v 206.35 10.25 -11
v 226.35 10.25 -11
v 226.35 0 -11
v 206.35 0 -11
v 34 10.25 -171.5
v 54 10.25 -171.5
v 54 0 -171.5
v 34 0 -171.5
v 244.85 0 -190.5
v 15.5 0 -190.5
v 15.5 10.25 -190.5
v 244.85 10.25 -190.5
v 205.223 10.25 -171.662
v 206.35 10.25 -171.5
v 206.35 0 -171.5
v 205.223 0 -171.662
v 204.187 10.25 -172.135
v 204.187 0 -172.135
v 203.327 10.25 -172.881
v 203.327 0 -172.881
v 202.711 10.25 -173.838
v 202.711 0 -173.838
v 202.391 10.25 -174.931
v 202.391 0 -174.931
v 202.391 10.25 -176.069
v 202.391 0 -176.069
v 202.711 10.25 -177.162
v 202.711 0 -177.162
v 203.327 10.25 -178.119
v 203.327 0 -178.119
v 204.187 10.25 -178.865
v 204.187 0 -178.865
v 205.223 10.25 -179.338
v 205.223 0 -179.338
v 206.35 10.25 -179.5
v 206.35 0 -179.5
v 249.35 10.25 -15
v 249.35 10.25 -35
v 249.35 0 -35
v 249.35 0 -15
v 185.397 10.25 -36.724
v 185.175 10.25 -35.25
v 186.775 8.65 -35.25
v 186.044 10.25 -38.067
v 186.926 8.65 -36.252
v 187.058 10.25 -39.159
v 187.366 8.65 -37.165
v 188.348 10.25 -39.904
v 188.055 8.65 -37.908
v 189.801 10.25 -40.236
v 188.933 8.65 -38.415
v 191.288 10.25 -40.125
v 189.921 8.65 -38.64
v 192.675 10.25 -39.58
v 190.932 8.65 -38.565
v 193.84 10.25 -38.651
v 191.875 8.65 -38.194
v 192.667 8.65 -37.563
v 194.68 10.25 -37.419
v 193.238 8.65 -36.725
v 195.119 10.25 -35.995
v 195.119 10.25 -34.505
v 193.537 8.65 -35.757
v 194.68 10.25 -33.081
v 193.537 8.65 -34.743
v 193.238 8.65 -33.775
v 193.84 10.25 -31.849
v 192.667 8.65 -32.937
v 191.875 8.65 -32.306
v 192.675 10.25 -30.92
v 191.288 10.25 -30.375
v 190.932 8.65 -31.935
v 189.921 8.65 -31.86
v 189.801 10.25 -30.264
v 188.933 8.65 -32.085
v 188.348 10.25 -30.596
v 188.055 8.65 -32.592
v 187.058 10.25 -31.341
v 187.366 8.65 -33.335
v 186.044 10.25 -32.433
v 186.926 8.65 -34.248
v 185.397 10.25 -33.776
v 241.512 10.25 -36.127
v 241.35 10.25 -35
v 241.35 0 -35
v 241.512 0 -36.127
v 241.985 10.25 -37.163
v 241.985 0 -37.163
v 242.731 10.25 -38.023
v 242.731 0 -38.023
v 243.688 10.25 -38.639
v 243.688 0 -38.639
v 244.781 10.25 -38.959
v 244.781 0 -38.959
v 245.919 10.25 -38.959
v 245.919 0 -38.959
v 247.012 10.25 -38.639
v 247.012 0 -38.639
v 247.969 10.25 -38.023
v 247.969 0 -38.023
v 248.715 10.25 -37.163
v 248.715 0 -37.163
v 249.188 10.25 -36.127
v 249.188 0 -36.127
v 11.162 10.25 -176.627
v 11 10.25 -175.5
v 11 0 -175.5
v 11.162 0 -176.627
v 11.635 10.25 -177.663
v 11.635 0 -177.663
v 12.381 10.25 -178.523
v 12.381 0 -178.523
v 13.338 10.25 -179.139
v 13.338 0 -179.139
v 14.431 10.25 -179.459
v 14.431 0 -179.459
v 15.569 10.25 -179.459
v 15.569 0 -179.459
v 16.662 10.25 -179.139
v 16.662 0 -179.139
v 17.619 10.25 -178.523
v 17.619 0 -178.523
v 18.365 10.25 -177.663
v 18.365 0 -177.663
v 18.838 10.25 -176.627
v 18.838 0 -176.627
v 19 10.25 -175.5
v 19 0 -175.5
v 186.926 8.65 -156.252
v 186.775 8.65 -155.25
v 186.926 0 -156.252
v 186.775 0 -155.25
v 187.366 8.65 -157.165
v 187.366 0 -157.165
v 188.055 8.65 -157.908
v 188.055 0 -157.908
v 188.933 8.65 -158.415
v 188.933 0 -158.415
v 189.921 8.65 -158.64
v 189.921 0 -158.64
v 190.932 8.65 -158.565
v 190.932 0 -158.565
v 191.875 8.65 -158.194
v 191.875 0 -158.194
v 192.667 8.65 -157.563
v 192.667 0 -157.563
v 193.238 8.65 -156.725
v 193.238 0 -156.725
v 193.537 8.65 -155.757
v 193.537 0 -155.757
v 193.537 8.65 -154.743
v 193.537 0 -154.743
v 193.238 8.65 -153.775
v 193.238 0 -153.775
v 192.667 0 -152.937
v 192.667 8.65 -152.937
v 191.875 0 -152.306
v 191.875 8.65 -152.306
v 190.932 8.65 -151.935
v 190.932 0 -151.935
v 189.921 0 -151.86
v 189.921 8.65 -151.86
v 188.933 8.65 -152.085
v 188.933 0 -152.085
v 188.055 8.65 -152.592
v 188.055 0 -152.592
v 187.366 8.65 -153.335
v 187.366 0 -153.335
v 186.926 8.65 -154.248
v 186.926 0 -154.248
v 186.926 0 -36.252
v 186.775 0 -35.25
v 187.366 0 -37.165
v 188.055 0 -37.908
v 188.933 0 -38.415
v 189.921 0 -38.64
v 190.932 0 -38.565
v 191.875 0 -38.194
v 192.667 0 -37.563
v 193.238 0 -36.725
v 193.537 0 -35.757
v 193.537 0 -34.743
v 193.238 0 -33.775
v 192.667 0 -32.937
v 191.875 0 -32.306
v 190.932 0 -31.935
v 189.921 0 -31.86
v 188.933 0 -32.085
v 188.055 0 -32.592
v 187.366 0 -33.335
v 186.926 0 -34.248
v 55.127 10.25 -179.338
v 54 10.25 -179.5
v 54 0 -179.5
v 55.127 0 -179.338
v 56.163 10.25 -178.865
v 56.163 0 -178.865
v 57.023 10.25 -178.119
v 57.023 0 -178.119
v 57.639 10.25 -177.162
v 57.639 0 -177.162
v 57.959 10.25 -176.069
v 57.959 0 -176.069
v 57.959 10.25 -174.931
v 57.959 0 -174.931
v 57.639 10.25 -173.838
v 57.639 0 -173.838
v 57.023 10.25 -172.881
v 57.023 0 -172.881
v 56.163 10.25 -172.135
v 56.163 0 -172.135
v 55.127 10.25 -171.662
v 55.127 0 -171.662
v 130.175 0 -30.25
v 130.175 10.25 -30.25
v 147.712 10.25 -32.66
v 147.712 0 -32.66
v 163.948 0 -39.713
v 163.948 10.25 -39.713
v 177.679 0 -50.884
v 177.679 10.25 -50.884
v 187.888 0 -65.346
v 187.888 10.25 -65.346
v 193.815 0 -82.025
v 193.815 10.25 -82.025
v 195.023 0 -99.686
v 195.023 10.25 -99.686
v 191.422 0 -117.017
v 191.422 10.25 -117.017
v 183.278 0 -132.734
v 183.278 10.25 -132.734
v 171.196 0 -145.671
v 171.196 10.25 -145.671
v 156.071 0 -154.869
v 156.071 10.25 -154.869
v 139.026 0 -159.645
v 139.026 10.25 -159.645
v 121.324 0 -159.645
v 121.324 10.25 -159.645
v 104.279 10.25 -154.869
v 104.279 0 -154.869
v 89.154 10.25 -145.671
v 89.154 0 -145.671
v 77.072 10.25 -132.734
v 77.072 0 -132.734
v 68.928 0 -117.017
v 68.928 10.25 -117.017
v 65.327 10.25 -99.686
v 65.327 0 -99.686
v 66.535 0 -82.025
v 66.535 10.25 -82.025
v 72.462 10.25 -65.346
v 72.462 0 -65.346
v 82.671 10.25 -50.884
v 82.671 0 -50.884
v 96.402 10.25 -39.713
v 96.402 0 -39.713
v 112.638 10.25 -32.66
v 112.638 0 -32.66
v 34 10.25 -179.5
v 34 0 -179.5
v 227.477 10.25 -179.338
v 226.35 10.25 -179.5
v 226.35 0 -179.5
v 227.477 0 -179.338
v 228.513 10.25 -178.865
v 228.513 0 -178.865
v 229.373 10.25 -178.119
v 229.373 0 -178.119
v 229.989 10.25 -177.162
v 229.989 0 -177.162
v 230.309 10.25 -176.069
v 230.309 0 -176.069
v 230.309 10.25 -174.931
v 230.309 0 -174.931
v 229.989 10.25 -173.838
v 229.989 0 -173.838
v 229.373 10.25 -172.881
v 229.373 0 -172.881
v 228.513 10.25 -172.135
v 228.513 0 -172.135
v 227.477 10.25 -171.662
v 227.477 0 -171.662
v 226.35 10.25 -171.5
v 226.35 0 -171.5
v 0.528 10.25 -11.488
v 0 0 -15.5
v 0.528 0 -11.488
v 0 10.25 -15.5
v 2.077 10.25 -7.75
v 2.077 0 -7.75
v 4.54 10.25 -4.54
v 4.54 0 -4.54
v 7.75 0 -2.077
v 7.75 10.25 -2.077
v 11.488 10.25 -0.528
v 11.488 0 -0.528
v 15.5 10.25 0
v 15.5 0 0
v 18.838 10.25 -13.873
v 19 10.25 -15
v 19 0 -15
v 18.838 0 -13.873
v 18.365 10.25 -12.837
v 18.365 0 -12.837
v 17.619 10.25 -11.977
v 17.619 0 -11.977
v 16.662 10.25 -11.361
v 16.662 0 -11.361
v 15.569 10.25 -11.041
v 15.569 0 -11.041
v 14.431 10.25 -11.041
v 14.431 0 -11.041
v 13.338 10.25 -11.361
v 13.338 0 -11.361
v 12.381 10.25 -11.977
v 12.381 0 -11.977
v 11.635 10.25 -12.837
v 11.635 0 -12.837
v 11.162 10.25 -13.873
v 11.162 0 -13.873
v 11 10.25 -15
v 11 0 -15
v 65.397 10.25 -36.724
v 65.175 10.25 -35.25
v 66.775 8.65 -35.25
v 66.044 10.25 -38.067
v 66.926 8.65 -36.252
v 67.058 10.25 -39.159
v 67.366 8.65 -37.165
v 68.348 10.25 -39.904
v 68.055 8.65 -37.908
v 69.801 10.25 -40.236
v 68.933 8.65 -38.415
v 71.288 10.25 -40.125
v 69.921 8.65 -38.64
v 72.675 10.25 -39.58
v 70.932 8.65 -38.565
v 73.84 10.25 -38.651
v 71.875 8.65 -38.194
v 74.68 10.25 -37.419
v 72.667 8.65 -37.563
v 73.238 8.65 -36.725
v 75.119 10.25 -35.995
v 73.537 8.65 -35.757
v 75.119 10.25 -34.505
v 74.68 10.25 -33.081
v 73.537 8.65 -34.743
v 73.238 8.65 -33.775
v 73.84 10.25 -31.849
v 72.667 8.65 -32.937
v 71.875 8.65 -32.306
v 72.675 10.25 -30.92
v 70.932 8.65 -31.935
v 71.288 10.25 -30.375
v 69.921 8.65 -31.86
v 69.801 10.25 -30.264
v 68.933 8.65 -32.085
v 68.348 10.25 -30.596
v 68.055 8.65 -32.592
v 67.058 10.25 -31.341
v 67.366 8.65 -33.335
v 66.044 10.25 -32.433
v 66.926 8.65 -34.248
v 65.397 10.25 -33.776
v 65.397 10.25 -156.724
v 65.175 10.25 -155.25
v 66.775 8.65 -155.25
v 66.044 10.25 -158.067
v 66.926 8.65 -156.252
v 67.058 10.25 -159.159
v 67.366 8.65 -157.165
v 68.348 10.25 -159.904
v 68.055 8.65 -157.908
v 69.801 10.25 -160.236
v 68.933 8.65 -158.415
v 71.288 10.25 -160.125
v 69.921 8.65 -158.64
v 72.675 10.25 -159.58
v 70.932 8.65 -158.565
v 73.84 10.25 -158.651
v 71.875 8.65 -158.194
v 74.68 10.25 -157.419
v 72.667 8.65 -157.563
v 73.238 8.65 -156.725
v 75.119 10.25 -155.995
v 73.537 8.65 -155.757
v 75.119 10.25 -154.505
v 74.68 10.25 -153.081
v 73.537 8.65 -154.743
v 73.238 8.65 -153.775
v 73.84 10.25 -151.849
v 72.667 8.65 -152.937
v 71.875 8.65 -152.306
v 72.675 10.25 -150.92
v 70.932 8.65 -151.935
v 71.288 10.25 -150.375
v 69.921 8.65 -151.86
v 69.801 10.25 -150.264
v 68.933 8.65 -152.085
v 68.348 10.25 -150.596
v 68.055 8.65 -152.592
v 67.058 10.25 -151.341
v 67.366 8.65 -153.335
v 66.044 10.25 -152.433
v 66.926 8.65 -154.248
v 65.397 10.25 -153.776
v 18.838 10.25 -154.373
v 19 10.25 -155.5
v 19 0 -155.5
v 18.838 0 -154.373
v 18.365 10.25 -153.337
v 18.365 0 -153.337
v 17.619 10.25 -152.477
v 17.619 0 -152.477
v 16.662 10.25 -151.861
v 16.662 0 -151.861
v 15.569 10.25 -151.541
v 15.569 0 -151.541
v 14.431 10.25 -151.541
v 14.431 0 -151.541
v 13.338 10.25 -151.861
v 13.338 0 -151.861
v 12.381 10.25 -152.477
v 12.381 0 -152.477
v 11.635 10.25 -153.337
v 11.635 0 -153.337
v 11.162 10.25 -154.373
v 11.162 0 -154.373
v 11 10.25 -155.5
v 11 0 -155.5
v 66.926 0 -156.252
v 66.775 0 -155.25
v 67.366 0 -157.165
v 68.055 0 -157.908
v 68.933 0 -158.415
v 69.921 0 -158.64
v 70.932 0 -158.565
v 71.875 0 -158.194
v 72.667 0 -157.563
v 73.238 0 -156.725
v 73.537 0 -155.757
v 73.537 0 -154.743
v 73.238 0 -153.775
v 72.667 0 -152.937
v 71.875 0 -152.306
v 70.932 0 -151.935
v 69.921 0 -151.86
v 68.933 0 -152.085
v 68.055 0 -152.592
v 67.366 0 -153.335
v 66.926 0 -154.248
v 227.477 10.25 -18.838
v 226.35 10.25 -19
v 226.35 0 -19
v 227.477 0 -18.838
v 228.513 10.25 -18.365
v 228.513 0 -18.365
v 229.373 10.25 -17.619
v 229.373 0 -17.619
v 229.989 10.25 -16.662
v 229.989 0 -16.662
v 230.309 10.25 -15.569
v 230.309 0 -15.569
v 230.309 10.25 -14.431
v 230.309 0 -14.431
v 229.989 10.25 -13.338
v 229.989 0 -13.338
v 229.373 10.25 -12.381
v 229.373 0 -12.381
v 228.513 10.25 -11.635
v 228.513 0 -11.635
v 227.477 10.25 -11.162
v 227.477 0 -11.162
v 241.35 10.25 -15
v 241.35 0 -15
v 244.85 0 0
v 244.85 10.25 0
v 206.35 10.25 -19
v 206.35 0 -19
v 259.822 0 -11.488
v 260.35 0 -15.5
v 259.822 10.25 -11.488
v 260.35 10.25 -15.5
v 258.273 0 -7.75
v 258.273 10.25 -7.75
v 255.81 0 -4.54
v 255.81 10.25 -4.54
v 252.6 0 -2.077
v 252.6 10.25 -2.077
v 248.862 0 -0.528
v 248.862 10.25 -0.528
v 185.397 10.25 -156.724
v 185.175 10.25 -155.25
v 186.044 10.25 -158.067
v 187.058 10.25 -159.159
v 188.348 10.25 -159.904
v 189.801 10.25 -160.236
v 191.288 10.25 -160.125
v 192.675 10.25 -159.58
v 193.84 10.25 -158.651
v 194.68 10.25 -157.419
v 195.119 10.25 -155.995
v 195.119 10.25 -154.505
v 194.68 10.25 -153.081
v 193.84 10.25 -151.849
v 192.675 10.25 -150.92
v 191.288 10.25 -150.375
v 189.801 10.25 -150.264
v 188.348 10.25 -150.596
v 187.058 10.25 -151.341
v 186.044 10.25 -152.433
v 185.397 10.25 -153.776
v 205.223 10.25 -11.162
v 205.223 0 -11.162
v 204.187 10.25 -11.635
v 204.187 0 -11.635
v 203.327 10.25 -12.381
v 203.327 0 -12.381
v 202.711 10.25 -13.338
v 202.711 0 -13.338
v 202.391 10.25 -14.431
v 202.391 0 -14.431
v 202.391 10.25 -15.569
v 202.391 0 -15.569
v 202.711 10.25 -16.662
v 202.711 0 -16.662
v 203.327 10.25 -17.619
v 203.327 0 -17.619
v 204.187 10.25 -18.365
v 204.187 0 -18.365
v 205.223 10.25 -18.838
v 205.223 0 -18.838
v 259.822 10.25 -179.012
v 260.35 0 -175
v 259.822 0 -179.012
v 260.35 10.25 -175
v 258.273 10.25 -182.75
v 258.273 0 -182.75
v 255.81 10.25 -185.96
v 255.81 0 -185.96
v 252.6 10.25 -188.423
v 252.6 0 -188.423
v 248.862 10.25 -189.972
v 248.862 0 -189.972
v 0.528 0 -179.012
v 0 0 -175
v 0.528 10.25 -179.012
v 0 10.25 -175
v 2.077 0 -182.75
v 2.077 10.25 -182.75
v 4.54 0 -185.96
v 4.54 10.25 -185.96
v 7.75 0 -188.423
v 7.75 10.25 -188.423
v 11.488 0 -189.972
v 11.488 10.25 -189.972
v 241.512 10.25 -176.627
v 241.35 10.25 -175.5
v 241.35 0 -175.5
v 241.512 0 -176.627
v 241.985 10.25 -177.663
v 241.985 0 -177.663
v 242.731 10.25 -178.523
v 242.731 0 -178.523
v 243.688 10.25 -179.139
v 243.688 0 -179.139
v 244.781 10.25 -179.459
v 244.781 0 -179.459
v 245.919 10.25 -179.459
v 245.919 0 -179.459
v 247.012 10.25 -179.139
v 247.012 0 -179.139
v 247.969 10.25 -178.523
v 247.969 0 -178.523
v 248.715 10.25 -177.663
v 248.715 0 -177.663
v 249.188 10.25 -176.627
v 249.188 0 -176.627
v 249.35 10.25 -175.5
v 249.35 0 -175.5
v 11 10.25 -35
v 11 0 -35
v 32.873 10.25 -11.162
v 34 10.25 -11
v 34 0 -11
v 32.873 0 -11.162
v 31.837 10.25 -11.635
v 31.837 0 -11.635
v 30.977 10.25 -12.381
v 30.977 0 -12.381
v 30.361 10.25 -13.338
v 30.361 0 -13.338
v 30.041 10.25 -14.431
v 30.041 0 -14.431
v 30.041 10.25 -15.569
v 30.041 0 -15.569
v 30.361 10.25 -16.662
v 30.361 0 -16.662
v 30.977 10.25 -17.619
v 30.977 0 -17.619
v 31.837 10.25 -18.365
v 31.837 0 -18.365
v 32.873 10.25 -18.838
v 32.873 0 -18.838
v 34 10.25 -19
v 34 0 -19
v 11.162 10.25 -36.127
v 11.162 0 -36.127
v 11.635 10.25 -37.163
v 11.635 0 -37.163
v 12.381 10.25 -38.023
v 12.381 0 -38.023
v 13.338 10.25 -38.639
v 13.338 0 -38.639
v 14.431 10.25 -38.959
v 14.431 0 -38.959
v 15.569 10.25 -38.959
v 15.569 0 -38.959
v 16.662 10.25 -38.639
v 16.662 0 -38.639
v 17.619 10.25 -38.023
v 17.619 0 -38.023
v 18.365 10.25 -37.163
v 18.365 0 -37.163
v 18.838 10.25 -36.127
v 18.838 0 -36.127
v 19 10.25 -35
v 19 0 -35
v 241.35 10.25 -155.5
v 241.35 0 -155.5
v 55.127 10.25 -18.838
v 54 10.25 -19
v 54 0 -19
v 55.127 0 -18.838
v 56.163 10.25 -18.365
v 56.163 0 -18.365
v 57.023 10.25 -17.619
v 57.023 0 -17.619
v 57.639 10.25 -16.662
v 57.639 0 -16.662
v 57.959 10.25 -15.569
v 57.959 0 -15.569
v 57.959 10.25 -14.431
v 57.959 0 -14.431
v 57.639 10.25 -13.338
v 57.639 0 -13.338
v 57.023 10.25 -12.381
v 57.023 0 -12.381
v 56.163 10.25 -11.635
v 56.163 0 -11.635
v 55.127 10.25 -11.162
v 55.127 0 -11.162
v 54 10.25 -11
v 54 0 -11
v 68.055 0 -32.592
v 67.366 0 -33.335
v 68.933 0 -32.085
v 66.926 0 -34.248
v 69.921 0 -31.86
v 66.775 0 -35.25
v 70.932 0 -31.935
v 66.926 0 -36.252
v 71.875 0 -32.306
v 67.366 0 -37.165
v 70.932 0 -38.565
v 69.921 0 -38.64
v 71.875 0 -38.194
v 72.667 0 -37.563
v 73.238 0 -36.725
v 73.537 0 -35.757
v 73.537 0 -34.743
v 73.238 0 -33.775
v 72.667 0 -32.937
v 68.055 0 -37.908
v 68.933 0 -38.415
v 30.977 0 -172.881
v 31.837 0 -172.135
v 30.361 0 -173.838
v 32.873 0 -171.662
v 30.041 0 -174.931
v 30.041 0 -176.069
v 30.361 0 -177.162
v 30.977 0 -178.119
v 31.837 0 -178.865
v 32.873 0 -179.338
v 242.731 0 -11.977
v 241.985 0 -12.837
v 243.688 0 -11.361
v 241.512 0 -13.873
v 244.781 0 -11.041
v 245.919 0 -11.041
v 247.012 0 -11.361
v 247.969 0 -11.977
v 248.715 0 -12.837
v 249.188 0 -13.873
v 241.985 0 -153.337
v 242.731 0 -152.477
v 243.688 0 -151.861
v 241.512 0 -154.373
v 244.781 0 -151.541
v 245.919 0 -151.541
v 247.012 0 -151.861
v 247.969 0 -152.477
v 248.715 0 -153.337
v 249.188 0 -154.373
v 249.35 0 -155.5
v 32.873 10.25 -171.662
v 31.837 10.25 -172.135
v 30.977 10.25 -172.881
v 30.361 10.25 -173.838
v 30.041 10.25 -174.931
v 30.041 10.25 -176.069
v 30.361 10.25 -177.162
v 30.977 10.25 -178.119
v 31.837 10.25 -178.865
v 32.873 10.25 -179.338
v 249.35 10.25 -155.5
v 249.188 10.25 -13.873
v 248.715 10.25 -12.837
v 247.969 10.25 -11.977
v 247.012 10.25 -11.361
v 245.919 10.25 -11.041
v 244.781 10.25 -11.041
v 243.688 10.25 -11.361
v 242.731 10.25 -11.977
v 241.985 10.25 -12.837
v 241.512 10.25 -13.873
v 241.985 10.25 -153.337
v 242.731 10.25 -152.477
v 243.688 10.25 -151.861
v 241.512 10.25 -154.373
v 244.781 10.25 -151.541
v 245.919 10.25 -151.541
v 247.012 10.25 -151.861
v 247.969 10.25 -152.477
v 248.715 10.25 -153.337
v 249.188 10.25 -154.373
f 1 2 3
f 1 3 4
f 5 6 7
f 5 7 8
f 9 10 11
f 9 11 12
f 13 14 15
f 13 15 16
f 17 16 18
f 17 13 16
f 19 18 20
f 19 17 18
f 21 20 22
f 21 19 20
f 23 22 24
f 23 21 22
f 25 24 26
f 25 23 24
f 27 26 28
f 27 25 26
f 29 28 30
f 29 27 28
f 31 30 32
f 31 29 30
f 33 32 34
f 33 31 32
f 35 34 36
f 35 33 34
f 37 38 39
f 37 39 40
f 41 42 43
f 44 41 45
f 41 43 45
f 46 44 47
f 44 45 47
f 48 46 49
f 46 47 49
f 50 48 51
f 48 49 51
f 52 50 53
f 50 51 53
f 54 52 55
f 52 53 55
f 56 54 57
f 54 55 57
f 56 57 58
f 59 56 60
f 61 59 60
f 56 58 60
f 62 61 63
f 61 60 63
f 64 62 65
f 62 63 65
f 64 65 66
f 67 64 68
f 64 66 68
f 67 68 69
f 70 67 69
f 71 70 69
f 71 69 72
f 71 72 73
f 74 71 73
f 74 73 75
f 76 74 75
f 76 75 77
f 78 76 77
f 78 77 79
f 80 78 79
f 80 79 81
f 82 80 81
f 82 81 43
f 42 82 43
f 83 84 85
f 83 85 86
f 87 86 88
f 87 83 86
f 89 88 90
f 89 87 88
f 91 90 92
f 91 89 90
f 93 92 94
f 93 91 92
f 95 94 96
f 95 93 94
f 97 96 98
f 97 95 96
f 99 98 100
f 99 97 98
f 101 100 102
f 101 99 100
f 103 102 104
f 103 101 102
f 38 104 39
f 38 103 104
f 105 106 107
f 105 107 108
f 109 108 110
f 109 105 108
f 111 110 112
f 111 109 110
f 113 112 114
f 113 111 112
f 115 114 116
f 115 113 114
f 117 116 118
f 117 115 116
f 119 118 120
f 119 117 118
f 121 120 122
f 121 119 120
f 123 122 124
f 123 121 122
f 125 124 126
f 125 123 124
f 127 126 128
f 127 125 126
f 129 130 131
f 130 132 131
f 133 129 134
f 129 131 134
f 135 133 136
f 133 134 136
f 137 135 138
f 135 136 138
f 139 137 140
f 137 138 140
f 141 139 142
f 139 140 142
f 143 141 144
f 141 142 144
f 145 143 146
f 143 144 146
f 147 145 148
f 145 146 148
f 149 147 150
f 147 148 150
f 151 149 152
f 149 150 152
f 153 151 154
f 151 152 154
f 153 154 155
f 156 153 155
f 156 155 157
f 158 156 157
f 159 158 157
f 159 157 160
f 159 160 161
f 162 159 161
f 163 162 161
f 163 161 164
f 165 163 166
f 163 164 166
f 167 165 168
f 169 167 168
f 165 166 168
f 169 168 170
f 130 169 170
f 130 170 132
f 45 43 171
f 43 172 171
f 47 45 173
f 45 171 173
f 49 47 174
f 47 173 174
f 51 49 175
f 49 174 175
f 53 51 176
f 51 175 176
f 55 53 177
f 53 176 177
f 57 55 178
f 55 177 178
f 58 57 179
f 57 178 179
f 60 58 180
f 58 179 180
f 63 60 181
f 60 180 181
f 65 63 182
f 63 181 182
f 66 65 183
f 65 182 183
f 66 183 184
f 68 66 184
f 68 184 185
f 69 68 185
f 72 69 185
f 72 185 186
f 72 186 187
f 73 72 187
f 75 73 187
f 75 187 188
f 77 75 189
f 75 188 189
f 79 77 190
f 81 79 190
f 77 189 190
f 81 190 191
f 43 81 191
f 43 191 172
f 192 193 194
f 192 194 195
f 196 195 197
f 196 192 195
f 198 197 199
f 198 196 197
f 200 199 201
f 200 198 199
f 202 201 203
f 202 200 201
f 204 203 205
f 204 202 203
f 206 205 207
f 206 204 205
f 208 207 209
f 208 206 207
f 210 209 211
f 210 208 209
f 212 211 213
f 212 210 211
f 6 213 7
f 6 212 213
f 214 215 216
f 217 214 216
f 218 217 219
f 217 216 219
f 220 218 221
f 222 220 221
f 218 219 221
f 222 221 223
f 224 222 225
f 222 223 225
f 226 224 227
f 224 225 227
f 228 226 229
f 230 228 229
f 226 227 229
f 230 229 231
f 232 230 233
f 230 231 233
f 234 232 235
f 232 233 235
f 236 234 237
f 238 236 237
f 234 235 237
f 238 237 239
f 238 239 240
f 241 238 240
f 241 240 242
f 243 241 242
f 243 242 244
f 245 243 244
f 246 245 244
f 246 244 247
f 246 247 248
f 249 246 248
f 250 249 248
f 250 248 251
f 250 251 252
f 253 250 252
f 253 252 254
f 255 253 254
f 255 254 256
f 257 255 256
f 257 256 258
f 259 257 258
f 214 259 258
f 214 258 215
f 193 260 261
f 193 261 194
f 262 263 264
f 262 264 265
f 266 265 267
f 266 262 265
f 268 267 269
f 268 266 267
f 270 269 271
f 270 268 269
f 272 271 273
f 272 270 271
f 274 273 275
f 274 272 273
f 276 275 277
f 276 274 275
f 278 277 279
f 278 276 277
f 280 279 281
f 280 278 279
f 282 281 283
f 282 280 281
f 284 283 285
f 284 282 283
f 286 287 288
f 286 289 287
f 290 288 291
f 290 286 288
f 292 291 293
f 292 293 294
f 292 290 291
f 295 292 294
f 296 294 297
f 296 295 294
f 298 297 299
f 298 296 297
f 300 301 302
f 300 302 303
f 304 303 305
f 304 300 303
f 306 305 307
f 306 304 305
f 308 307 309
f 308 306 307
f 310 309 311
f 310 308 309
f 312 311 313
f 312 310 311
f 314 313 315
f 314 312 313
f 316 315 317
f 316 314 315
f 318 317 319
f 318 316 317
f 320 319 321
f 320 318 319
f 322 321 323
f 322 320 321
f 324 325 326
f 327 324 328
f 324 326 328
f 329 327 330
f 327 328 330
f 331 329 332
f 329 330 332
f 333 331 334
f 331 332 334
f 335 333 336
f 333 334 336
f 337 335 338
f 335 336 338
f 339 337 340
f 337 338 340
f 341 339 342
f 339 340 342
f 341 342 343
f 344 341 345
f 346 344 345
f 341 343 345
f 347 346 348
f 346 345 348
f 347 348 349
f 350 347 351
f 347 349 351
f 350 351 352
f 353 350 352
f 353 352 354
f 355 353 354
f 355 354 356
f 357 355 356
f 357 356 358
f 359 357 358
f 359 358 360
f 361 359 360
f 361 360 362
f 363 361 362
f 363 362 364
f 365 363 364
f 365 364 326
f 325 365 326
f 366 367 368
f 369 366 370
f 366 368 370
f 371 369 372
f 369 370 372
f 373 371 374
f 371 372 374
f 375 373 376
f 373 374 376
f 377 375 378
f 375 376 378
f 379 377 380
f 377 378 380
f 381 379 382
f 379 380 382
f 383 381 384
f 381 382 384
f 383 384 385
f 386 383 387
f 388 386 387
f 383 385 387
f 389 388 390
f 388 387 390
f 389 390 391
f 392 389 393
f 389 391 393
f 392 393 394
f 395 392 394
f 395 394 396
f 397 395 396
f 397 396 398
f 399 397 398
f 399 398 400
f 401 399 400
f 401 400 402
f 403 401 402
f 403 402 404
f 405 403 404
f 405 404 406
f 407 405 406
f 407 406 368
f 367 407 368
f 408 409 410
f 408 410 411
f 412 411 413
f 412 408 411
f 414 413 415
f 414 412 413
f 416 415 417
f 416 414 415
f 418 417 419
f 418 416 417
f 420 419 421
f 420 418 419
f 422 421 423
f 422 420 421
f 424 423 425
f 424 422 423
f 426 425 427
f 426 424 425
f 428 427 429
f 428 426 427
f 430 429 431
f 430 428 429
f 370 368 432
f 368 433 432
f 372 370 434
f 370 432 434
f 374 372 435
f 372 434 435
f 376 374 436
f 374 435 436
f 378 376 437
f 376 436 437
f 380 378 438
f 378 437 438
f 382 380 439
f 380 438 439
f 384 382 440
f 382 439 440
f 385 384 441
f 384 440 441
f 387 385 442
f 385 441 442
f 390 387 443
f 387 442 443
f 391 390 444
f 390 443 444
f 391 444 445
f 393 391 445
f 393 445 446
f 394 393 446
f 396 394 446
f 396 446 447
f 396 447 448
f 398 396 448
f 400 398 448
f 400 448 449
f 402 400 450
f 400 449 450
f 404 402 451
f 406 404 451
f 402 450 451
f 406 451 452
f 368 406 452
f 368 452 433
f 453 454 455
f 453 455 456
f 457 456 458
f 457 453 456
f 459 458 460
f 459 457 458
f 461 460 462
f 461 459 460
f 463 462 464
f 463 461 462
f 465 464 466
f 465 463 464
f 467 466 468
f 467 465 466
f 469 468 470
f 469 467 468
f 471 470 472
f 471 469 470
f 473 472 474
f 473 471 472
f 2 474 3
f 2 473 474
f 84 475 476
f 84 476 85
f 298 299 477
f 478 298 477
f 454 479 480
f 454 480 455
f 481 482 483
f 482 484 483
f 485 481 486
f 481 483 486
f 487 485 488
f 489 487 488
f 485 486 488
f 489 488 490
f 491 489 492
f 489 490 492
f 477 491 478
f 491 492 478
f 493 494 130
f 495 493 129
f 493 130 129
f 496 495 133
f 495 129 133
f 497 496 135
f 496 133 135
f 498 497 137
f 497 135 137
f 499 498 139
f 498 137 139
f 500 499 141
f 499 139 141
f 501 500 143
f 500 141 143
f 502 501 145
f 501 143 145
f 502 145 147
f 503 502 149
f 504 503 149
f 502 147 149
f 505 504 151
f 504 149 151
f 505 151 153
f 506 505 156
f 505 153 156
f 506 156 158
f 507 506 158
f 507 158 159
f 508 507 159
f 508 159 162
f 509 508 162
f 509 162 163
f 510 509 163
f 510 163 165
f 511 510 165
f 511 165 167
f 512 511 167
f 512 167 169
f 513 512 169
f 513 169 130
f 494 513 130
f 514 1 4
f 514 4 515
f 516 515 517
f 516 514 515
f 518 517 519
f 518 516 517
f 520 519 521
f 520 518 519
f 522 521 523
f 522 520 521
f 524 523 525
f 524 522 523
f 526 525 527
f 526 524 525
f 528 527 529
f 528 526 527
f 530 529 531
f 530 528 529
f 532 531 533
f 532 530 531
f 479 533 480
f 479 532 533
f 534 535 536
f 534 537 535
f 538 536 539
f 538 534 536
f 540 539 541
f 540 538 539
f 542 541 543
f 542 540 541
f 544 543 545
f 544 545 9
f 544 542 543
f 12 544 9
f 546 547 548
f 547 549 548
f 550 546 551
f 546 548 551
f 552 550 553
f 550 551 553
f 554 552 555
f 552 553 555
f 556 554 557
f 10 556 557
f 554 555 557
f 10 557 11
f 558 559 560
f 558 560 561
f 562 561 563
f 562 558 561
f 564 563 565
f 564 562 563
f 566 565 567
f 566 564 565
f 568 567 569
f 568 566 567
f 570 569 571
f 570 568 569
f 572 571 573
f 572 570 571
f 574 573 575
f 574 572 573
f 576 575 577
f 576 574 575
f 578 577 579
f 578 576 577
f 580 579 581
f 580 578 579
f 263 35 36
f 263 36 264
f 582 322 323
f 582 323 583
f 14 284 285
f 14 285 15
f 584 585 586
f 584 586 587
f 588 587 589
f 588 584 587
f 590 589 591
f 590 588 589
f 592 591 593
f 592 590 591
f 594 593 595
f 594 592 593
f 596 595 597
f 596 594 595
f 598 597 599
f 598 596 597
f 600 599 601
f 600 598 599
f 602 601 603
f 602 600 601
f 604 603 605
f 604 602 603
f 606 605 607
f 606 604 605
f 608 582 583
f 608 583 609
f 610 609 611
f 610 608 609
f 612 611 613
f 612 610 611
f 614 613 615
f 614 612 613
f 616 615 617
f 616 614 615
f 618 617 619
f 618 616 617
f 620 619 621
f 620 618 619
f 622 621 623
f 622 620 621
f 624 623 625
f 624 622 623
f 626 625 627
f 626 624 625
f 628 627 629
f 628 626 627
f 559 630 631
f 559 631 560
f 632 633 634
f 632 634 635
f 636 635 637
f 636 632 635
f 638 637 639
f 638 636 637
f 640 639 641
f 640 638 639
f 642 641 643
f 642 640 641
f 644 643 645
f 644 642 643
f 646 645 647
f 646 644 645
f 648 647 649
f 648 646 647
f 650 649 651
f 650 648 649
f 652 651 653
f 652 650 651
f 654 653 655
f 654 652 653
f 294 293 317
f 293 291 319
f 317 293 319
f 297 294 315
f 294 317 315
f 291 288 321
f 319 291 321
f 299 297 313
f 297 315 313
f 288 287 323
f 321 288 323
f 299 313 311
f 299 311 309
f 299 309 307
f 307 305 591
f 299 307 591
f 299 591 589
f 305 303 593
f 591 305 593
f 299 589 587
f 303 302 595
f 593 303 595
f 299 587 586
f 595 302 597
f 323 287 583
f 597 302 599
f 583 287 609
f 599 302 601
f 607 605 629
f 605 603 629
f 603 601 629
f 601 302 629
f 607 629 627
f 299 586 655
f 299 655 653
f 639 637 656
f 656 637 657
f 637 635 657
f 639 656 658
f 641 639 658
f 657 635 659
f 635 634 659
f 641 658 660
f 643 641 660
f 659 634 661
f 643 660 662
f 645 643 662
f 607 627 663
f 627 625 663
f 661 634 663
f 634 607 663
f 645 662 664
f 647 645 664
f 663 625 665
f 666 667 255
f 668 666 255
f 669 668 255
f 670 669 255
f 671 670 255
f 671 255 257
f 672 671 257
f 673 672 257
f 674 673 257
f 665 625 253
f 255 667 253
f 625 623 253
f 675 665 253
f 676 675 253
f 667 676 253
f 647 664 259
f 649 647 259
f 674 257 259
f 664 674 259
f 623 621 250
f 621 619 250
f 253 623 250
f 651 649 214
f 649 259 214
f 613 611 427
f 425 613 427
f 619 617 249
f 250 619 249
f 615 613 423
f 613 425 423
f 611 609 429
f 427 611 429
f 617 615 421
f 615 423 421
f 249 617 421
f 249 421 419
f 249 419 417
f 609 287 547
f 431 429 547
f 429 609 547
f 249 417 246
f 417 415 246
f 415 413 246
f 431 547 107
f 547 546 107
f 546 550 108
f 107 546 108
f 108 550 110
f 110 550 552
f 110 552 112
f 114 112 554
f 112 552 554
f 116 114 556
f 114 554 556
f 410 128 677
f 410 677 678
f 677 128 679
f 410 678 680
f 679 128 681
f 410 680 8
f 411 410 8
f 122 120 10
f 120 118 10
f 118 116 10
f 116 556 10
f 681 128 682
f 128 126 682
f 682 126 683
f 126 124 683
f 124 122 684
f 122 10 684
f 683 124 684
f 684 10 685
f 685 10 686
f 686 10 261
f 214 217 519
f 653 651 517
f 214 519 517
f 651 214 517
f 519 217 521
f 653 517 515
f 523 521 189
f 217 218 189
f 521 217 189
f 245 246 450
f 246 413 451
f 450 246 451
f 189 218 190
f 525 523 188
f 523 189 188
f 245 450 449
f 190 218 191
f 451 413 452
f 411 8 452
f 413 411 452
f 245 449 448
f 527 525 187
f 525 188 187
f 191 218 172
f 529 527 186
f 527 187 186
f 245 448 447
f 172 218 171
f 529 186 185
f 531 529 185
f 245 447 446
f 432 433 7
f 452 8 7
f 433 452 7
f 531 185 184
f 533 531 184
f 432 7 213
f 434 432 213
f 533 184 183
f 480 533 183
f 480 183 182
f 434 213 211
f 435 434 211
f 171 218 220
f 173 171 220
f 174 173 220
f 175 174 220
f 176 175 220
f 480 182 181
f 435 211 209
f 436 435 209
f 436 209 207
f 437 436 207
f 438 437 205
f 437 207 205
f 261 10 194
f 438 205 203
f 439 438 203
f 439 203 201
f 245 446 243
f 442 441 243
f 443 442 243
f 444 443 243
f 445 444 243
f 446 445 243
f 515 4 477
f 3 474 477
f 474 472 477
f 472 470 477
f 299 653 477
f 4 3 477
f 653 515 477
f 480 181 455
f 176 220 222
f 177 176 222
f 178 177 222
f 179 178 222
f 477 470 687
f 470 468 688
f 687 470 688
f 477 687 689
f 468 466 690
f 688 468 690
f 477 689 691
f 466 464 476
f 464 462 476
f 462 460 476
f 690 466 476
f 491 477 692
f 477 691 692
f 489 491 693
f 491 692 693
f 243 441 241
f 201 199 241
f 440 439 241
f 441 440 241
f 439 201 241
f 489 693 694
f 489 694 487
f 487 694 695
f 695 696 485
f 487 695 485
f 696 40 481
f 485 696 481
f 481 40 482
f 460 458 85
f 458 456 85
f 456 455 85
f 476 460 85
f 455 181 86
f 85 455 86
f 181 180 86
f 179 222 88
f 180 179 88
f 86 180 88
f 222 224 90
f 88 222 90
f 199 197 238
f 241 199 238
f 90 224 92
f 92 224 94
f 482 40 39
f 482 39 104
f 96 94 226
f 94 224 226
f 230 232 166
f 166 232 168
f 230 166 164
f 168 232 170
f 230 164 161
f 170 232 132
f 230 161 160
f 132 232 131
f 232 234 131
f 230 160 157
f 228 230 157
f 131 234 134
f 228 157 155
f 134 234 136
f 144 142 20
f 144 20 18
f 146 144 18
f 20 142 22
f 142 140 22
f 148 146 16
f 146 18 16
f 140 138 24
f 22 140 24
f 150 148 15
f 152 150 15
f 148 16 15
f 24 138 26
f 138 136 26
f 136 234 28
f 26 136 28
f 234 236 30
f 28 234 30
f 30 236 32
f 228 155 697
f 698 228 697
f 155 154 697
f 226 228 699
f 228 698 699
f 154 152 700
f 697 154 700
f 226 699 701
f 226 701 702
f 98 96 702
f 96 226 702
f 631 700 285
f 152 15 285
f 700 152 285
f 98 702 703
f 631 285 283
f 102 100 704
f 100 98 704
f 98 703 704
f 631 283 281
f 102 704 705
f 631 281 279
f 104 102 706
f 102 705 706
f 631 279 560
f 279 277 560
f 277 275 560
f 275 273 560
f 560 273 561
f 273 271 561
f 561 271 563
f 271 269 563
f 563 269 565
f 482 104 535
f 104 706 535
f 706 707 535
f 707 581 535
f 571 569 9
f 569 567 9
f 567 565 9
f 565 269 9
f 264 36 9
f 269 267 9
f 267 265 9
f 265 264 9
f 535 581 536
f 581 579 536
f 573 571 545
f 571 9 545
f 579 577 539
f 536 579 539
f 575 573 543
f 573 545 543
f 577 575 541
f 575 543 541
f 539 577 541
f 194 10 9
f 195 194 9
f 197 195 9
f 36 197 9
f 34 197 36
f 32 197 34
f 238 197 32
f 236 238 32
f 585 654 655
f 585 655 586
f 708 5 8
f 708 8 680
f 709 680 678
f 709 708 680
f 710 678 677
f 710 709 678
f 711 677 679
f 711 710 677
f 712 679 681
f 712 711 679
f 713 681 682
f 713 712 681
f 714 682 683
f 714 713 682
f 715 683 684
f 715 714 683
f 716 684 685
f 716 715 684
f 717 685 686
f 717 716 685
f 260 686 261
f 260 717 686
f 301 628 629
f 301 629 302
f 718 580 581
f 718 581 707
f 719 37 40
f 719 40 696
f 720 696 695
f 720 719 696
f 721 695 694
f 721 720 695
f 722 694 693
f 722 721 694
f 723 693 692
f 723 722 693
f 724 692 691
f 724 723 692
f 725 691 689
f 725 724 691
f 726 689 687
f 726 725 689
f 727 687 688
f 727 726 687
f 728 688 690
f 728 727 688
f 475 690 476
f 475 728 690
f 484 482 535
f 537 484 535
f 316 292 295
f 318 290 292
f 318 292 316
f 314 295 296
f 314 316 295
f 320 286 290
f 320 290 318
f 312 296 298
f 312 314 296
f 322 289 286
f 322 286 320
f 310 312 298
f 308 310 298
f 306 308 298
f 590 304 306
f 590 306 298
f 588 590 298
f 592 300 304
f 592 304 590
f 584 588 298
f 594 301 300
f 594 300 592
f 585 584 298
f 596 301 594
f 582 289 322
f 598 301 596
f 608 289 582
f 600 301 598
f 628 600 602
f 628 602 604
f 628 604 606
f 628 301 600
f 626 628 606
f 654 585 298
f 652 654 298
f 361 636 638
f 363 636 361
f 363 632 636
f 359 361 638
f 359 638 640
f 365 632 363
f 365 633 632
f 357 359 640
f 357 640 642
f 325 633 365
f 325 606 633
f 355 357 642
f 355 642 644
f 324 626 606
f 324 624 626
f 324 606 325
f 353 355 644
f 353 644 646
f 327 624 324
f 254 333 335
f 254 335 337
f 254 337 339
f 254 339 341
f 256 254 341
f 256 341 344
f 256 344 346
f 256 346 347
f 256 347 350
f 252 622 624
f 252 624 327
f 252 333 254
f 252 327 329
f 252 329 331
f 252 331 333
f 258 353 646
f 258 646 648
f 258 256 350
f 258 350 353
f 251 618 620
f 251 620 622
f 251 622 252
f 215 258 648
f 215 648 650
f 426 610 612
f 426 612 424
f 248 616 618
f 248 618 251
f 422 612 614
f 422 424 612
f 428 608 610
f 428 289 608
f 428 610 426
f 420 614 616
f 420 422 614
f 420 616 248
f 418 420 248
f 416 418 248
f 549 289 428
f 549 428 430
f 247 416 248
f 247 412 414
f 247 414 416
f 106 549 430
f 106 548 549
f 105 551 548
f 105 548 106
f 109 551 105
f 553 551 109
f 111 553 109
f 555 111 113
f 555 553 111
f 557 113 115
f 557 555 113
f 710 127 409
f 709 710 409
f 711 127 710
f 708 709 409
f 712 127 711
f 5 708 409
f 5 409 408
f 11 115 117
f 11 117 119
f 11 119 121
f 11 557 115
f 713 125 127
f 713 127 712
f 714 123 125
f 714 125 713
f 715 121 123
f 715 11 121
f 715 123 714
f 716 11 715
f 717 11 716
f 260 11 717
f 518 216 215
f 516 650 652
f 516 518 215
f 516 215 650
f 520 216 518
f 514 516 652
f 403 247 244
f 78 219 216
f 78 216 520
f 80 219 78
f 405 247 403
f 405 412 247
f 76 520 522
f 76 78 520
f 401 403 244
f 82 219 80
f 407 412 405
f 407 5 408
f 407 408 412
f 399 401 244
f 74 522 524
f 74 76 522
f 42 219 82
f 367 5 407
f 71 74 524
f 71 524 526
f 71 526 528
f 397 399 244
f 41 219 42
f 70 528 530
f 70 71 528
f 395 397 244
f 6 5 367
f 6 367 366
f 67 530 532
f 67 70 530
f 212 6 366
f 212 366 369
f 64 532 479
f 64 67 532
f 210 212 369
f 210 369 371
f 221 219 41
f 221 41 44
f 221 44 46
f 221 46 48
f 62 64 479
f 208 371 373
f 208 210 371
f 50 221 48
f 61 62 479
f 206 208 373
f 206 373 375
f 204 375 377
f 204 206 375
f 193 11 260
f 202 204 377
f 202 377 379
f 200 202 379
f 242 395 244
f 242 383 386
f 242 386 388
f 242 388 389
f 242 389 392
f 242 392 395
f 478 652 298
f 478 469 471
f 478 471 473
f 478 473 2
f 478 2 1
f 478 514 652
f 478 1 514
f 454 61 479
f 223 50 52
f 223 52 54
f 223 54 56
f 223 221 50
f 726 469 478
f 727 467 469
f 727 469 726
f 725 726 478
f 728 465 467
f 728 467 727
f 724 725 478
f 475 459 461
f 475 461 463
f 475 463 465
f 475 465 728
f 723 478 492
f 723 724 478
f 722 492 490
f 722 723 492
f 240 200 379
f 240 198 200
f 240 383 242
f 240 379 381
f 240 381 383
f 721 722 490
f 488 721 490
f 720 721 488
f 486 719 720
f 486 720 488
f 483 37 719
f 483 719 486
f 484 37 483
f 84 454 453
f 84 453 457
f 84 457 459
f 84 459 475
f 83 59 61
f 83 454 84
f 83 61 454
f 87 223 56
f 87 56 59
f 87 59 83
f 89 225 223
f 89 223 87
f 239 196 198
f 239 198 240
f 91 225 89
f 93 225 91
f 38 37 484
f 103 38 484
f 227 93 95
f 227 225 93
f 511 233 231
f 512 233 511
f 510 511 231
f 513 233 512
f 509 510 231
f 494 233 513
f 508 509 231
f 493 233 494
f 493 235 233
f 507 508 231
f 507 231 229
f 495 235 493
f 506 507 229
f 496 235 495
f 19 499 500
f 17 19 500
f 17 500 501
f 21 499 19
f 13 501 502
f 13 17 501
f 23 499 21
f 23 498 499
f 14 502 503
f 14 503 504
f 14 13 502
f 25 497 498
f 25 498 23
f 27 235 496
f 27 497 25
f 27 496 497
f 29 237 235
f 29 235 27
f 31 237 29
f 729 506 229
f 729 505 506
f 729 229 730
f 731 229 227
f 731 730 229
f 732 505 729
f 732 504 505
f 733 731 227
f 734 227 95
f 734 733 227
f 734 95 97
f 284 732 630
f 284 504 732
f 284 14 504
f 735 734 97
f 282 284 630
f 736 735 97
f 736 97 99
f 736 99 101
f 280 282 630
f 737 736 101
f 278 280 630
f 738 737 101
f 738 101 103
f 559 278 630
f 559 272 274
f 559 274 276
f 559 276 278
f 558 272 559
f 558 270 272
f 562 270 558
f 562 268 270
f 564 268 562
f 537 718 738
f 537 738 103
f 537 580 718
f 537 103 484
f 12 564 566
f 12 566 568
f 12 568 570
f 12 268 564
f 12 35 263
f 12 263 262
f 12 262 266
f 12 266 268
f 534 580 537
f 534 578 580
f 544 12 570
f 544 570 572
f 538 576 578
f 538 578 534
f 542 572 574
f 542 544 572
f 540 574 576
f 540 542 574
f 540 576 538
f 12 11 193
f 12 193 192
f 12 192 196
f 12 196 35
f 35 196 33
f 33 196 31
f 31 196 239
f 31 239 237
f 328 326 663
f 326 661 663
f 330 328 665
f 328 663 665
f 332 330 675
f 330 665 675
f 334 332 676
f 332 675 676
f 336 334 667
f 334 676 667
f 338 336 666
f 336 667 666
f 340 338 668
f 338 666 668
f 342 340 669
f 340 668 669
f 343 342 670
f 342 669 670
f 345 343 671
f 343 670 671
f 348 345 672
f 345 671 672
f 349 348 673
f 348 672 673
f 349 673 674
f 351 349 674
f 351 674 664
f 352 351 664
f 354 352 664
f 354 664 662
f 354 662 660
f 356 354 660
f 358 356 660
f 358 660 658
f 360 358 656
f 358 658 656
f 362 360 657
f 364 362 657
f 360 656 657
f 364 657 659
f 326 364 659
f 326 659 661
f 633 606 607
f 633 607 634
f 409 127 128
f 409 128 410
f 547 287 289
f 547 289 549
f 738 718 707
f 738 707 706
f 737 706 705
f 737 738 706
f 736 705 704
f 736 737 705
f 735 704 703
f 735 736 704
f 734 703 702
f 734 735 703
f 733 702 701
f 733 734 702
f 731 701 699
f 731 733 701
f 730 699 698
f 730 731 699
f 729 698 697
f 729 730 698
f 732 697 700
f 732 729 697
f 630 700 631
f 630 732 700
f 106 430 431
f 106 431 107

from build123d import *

# Parameters (mm, degrees)
SKETCH1_W                      = 260.35
SKETCH1_H                      = 190.5
BASE_DEPTH                     = 10.25
SKETCH2_R                      = 65
HOLES_DEPTH                    = 323.765293983
M8_ARM_MOUNT_HOLES_D           = 6.8
M8_ARM_MOUNT_HOLES_CSINK_D     = 10
M8_ARM_MOUNT_HOLES_CSINK_ANGLE = 90
FILLET1_R                      = 15.5


with BuildPart() as part:
    # Sketch1 → Base (new body)
    with BuildSketch(Plane(origin=(0, 0, 0), x_dir=(1, 0, 0), z_dir=(0, 1, 0))):
        with Locations((130.175, 95.25)):
            Rectangle(SKETCH1_W, SKETCH1_H)
    extrude(amount=BASE_DEPTH)

    # Sketch2 → Holes (cut, through all)
    with BuildSketch(Plane(origin=(0, 10.25, 0), x_dir=(1, 0, 0), z_dir=(0, 1, 0))):
        with Locations(Location((130.175, 95.25, 0), (0, 0, 270))):
            Circle(SKETCH2_R)
        with BuildLine():
            Line((206.35, 19), (226.35, 19))
            ThreePointArc((226.35, 19), (230.35, 15), (226.35, 11))
            Line((226.35, 11), (206.35, 11))
            ThreePointArc((206.35, 11), (202.35, 15), (206.35, 19))
        make_face()
        with BuildLine():
            Line((241.35, 15), (241.35, 35))
            ThreePointArc((241.35, 35), (245.35, 39), (249.35, 35))
            Line((249.35, 35), (249.35, 15))
            ThreePointArc((249.35, 15), (245.35, 11), (241.35, 15))
        make_face()
        with BuildLine():
            Line((11, 15), (11, 35))
            ThreePointArc((11, 35), (15, 39), (19, 35))
            Line((19, 35), (19, 15))
            ThreePointArc((19, 15), (15, 11), (11, 15))
        make_face()
        with BuildLine():
            Line((11, 155.5), (11, 175.5))
            ThreePointArc((11, 175.5), (15, 179.5), (19, 175.5))
            Line((19, 175.5), (19, 155.5))
            ThreePointArc((19, 155.5), (15, 151.5), (11, 155.5))
        make_face()
        with BuildLine():
            Line((241.35, 155.5), (241.35, 175.5))
            ThreePointArc((241.35, 175.5), (245.35, 179.5), (249.35, 175.5))
            Line((249.35, 175.5), (249.35, 155.5))
            ThreePointArc((249.35, 155.5), (245.35, 151.5), (241.35, 155.5))
        make_face()
        with BuildLine():
            Line((34, 19), (54, 19))
            ThreePointArc((54, 19), (58, 15), (54, 11))
            Line((54, 11), (34, 11))
            ThreePointArc((34, 11), (30, 15), (34, 19))
        make_face()
        with BuildLine():
            Line((206.35, 179.5), (226.35, 179.5))
            ThreePointArc((226.35, 179.5), (230.35, 175.5), (226.35, 171.5))
            Line((226.35, 171.5), (206.35, 171.5))
            ThreePointArc((206.35, 171.5), (202.35, 175.5), (206.35, 179.5))
        make_face()
        with BuildLine():
            Line((34, 179.5), (54, 179.5))
            ThreePointArc((54, 179.5), (58, 175.5), (54, 171.5))
            Line((54, 171.5), (34, 171.5))
            ThreePointArc((34, 171.5), (30, 175.5), (34, 179.5))
        make_face()
    extrude(amount=-HOLES_DEPTH, mode=Mode.SUBTRACT)

    # M8 Arm Mount Holes (through all)
    with Locations(Plane(origin=(0, 10.25, 0), x_dir=(1, 0, 0), z_dir=(0, 1, 0))):
        with Locations((70.175, 155.25), (190.175, 155.25), (190.175, 35.25), (70.175, 35.25)):
            CounterSinkHole(M8_ARM_MOUNT_HOLES_D / 2, M8_ARM_MOUNT_HOLES_CSINK_D / 2, counter_sink_angle=M8_ARM_MOUNT_HOLES_CSINK_ANGLE)

    # Fillet1
    fillet1_edges = [part.edges().sort_by_distance(p)[0] for p in [
        (0, 5.125, -190.5),
        (260.35, 5.125, -190.5),
        (260.35, 5.125, 0),
        (0, 5.125, 0),
    ]]
    fillet(fillet1_edges, radius=FILLET1_R)


solid = part.part
